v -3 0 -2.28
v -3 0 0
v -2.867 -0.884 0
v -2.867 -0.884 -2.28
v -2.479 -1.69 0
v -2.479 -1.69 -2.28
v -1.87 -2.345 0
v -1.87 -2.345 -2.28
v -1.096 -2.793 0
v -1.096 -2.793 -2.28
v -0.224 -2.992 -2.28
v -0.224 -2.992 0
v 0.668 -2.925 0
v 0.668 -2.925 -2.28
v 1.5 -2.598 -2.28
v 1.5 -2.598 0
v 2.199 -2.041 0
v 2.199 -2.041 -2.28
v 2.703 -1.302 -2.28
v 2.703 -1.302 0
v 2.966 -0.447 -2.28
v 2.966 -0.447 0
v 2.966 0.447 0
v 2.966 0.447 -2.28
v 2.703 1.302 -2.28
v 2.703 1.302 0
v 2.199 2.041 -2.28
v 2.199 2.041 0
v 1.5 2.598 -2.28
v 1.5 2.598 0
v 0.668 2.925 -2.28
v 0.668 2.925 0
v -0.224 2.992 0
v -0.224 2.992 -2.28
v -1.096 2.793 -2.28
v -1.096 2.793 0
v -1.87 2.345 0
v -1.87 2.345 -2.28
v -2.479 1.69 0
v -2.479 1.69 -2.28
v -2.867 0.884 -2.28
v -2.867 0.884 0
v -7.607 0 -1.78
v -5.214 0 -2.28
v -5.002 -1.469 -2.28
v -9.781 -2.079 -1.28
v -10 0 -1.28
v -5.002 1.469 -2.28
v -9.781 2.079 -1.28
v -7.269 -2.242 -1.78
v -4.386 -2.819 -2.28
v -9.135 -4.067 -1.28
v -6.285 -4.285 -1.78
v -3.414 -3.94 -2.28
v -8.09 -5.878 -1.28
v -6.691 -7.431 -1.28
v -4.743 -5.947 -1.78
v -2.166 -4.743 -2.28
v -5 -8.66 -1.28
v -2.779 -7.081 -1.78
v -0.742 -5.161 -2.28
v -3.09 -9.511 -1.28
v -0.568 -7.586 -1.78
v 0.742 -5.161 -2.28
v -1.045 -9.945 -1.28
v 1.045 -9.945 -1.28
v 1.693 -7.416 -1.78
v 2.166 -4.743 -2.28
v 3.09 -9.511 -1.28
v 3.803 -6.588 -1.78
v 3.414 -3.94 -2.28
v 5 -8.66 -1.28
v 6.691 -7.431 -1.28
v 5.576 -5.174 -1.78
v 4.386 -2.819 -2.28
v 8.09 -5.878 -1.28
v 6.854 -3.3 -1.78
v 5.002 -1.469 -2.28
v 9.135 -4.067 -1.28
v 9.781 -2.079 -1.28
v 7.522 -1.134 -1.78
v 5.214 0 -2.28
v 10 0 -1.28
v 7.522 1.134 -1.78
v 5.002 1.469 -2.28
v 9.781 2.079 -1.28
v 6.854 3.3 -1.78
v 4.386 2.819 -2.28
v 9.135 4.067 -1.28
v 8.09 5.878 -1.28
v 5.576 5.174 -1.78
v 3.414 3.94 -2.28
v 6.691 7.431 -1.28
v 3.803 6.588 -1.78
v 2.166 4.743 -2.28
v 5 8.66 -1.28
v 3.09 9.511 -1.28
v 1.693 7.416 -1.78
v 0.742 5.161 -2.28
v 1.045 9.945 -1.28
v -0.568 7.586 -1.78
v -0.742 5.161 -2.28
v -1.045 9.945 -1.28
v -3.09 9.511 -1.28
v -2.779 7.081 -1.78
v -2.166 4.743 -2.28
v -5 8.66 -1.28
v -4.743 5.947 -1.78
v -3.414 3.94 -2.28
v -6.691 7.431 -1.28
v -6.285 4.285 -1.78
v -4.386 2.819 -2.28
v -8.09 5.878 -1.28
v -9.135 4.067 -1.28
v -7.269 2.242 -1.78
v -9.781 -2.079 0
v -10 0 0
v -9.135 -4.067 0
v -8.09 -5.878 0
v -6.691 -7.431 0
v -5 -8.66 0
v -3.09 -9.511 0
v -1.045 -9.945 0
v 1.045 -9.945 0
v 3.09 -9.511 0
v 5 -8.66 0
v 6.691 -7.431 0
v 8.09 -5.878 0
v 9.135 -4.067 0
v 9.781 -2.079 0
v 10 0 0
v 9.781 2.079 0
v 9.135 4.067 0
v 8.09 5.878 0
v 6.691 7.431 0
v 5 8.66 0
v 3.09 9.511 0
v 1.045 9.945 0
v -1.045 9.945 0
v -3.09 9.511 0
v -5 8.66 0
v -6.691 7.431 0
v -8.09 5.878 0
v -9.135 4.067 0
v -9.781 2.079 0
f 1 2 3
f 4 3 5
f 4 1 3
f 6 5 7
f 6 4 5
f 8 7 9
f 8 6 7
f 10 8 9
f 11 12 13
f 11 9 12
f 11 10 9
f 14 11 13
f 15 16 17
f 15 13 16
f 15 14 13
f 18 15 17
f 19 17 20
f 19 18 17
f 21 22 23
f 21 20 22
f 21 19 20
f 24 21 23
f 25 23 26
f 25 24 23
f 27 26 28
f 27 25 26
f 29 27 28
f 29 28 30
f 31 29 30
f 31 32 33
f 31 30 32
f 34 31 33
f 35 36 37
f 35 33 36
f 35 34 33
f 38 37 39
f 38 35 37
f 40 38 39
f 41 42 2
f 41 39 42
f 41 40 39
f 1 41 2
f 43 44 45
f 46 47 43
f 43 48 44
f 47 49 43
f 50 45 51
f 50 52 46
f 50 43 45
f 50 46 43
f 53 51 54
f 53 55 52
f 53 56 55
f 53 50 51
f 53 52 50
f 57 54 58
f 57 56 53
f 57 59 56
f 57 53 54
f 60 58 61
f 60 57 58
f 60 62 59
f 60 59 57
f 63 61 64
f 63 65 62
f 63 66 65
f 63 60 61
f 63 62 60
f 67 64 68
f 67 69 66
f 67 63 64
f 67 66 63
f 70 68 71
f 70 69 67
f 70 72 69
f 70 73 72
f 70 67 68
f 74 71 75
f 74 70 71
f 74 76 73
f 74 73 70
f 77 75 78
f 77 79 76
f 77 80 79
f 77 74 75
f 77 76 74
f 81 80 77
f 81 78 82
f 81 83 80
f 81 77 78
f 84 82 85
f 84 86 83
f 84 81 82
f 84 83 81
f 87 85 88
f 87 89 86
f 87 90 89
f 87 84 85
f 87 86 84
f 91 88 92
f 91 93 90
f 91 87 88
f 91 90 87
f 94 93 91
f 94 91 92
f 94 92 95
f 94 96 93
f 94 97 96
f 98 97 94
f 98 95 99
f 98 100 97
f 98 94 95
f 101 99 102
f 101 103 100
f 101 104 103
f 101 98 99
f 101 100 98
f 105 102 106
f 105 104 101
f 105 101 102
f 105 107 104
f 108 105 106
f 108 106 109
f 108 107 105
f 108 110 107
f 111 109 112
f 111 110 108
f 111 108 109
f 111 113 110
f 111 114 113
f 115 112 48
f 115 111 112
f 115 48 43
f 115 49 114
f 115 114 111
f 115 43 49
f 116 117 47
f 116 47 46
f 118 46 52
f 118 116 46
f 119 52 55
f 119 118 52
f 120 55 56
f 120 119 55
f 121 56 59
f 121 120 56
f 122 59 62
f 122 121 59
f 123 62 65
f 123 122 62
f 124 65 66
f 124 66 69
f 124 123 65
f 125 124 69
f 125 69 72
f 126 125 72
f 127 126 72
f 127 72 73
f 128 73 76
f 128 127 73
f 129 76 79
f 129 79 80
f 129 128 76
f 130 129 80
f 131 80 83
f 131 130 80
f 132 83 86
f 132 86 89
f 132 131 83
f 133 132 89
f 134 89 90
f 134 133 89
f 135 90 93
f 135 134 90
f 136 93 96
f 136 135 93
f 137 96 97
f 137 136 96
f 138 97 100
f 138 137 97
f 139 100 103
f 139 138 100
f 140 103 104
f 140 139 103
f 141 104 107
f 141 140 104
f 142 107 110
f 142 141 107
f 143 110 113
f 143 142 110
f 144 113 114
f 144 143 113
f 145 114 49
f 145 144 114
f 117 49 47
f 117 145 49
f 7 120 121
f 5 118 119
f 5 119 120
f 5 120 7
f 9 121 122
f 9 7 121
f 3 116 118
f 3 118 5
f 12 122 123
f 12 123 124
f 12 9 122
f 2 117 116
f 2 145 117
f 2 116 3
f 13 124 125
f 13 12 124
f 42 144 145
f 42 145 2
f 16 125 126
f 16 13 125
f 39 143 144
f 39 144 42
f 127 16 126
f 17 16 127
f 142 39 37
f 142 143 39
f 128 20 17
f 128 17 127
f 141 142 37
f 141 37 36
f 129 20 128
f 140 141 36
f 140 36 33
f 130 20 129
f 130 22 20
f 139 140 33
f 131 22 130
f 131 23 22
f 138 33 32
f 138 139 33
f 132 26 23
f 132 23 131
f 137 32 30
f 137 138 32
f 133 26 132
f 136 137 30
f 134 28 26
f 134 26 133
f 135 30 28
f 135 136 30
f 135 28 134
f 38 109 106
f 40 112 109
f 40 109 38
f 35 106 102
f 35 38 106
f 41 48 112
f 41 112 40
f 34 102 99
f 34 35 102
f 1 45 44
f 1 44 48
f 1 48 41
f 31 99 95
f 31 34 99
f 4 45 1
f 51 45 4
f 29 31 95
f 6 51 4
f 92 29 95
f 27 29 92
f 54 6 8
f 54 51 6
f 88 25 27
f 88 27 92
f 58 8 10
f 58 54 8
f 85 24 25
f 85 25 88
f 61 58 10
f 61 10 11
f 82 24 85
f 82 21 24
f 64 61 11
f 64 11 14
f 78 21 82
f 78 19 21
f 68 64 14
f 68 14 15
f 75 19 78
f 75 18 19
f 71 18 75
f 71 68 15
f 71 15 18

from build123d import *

# Parameters (mm, degrees)
CYLINDER_R                     = 15
CYLINDER_DEPTH                 = 10
REVOLVE_ONTO_SKETCH_ROLL_ANGLE = 90


with BuildPart() as cylinder:
    # Cylinder → Cylinder (new body)
    with BuildSketch(Plane.XY):
        Circle(CYLINDER_R)
    extrude(amount=CYLINDER_DEPTH)


with BuildPart() as cut_float:
    # Sketch as drawn → Revolve (revolve)
    with BuildSketch(Plane.XY):
        Polygon((-3, 0), (-5.213686, 0), (-10, 1), (-10, 5), (-3, 5), align=None)
    revolve(axis=Axis((0, 0, 0), (0, 1, 0)))


with BuildPart() as cut_float_1:
    # Revolve onto Sketch roll: moved
    add(cut_float.part.rotate(Axis((0, 0, 0), (1, 0, 0)), REVOLVE_ONTO_SKETCH_ROLL_ANGLE))


with BuildPart() as cut_float_2:
    # Revolve onto Sketch placement: moved
    add(cut_float_1.part)


with BuildPart() as cut_float_3:
    # Revolve placement: moved
    add(cut_float_2.part.moved(Location((0, 0, -2.28))))

    # Cut: cut Cylinder
    add(cylinder.part, mode=Mode.SUBTRACT)


solid = cut_float_3.part
